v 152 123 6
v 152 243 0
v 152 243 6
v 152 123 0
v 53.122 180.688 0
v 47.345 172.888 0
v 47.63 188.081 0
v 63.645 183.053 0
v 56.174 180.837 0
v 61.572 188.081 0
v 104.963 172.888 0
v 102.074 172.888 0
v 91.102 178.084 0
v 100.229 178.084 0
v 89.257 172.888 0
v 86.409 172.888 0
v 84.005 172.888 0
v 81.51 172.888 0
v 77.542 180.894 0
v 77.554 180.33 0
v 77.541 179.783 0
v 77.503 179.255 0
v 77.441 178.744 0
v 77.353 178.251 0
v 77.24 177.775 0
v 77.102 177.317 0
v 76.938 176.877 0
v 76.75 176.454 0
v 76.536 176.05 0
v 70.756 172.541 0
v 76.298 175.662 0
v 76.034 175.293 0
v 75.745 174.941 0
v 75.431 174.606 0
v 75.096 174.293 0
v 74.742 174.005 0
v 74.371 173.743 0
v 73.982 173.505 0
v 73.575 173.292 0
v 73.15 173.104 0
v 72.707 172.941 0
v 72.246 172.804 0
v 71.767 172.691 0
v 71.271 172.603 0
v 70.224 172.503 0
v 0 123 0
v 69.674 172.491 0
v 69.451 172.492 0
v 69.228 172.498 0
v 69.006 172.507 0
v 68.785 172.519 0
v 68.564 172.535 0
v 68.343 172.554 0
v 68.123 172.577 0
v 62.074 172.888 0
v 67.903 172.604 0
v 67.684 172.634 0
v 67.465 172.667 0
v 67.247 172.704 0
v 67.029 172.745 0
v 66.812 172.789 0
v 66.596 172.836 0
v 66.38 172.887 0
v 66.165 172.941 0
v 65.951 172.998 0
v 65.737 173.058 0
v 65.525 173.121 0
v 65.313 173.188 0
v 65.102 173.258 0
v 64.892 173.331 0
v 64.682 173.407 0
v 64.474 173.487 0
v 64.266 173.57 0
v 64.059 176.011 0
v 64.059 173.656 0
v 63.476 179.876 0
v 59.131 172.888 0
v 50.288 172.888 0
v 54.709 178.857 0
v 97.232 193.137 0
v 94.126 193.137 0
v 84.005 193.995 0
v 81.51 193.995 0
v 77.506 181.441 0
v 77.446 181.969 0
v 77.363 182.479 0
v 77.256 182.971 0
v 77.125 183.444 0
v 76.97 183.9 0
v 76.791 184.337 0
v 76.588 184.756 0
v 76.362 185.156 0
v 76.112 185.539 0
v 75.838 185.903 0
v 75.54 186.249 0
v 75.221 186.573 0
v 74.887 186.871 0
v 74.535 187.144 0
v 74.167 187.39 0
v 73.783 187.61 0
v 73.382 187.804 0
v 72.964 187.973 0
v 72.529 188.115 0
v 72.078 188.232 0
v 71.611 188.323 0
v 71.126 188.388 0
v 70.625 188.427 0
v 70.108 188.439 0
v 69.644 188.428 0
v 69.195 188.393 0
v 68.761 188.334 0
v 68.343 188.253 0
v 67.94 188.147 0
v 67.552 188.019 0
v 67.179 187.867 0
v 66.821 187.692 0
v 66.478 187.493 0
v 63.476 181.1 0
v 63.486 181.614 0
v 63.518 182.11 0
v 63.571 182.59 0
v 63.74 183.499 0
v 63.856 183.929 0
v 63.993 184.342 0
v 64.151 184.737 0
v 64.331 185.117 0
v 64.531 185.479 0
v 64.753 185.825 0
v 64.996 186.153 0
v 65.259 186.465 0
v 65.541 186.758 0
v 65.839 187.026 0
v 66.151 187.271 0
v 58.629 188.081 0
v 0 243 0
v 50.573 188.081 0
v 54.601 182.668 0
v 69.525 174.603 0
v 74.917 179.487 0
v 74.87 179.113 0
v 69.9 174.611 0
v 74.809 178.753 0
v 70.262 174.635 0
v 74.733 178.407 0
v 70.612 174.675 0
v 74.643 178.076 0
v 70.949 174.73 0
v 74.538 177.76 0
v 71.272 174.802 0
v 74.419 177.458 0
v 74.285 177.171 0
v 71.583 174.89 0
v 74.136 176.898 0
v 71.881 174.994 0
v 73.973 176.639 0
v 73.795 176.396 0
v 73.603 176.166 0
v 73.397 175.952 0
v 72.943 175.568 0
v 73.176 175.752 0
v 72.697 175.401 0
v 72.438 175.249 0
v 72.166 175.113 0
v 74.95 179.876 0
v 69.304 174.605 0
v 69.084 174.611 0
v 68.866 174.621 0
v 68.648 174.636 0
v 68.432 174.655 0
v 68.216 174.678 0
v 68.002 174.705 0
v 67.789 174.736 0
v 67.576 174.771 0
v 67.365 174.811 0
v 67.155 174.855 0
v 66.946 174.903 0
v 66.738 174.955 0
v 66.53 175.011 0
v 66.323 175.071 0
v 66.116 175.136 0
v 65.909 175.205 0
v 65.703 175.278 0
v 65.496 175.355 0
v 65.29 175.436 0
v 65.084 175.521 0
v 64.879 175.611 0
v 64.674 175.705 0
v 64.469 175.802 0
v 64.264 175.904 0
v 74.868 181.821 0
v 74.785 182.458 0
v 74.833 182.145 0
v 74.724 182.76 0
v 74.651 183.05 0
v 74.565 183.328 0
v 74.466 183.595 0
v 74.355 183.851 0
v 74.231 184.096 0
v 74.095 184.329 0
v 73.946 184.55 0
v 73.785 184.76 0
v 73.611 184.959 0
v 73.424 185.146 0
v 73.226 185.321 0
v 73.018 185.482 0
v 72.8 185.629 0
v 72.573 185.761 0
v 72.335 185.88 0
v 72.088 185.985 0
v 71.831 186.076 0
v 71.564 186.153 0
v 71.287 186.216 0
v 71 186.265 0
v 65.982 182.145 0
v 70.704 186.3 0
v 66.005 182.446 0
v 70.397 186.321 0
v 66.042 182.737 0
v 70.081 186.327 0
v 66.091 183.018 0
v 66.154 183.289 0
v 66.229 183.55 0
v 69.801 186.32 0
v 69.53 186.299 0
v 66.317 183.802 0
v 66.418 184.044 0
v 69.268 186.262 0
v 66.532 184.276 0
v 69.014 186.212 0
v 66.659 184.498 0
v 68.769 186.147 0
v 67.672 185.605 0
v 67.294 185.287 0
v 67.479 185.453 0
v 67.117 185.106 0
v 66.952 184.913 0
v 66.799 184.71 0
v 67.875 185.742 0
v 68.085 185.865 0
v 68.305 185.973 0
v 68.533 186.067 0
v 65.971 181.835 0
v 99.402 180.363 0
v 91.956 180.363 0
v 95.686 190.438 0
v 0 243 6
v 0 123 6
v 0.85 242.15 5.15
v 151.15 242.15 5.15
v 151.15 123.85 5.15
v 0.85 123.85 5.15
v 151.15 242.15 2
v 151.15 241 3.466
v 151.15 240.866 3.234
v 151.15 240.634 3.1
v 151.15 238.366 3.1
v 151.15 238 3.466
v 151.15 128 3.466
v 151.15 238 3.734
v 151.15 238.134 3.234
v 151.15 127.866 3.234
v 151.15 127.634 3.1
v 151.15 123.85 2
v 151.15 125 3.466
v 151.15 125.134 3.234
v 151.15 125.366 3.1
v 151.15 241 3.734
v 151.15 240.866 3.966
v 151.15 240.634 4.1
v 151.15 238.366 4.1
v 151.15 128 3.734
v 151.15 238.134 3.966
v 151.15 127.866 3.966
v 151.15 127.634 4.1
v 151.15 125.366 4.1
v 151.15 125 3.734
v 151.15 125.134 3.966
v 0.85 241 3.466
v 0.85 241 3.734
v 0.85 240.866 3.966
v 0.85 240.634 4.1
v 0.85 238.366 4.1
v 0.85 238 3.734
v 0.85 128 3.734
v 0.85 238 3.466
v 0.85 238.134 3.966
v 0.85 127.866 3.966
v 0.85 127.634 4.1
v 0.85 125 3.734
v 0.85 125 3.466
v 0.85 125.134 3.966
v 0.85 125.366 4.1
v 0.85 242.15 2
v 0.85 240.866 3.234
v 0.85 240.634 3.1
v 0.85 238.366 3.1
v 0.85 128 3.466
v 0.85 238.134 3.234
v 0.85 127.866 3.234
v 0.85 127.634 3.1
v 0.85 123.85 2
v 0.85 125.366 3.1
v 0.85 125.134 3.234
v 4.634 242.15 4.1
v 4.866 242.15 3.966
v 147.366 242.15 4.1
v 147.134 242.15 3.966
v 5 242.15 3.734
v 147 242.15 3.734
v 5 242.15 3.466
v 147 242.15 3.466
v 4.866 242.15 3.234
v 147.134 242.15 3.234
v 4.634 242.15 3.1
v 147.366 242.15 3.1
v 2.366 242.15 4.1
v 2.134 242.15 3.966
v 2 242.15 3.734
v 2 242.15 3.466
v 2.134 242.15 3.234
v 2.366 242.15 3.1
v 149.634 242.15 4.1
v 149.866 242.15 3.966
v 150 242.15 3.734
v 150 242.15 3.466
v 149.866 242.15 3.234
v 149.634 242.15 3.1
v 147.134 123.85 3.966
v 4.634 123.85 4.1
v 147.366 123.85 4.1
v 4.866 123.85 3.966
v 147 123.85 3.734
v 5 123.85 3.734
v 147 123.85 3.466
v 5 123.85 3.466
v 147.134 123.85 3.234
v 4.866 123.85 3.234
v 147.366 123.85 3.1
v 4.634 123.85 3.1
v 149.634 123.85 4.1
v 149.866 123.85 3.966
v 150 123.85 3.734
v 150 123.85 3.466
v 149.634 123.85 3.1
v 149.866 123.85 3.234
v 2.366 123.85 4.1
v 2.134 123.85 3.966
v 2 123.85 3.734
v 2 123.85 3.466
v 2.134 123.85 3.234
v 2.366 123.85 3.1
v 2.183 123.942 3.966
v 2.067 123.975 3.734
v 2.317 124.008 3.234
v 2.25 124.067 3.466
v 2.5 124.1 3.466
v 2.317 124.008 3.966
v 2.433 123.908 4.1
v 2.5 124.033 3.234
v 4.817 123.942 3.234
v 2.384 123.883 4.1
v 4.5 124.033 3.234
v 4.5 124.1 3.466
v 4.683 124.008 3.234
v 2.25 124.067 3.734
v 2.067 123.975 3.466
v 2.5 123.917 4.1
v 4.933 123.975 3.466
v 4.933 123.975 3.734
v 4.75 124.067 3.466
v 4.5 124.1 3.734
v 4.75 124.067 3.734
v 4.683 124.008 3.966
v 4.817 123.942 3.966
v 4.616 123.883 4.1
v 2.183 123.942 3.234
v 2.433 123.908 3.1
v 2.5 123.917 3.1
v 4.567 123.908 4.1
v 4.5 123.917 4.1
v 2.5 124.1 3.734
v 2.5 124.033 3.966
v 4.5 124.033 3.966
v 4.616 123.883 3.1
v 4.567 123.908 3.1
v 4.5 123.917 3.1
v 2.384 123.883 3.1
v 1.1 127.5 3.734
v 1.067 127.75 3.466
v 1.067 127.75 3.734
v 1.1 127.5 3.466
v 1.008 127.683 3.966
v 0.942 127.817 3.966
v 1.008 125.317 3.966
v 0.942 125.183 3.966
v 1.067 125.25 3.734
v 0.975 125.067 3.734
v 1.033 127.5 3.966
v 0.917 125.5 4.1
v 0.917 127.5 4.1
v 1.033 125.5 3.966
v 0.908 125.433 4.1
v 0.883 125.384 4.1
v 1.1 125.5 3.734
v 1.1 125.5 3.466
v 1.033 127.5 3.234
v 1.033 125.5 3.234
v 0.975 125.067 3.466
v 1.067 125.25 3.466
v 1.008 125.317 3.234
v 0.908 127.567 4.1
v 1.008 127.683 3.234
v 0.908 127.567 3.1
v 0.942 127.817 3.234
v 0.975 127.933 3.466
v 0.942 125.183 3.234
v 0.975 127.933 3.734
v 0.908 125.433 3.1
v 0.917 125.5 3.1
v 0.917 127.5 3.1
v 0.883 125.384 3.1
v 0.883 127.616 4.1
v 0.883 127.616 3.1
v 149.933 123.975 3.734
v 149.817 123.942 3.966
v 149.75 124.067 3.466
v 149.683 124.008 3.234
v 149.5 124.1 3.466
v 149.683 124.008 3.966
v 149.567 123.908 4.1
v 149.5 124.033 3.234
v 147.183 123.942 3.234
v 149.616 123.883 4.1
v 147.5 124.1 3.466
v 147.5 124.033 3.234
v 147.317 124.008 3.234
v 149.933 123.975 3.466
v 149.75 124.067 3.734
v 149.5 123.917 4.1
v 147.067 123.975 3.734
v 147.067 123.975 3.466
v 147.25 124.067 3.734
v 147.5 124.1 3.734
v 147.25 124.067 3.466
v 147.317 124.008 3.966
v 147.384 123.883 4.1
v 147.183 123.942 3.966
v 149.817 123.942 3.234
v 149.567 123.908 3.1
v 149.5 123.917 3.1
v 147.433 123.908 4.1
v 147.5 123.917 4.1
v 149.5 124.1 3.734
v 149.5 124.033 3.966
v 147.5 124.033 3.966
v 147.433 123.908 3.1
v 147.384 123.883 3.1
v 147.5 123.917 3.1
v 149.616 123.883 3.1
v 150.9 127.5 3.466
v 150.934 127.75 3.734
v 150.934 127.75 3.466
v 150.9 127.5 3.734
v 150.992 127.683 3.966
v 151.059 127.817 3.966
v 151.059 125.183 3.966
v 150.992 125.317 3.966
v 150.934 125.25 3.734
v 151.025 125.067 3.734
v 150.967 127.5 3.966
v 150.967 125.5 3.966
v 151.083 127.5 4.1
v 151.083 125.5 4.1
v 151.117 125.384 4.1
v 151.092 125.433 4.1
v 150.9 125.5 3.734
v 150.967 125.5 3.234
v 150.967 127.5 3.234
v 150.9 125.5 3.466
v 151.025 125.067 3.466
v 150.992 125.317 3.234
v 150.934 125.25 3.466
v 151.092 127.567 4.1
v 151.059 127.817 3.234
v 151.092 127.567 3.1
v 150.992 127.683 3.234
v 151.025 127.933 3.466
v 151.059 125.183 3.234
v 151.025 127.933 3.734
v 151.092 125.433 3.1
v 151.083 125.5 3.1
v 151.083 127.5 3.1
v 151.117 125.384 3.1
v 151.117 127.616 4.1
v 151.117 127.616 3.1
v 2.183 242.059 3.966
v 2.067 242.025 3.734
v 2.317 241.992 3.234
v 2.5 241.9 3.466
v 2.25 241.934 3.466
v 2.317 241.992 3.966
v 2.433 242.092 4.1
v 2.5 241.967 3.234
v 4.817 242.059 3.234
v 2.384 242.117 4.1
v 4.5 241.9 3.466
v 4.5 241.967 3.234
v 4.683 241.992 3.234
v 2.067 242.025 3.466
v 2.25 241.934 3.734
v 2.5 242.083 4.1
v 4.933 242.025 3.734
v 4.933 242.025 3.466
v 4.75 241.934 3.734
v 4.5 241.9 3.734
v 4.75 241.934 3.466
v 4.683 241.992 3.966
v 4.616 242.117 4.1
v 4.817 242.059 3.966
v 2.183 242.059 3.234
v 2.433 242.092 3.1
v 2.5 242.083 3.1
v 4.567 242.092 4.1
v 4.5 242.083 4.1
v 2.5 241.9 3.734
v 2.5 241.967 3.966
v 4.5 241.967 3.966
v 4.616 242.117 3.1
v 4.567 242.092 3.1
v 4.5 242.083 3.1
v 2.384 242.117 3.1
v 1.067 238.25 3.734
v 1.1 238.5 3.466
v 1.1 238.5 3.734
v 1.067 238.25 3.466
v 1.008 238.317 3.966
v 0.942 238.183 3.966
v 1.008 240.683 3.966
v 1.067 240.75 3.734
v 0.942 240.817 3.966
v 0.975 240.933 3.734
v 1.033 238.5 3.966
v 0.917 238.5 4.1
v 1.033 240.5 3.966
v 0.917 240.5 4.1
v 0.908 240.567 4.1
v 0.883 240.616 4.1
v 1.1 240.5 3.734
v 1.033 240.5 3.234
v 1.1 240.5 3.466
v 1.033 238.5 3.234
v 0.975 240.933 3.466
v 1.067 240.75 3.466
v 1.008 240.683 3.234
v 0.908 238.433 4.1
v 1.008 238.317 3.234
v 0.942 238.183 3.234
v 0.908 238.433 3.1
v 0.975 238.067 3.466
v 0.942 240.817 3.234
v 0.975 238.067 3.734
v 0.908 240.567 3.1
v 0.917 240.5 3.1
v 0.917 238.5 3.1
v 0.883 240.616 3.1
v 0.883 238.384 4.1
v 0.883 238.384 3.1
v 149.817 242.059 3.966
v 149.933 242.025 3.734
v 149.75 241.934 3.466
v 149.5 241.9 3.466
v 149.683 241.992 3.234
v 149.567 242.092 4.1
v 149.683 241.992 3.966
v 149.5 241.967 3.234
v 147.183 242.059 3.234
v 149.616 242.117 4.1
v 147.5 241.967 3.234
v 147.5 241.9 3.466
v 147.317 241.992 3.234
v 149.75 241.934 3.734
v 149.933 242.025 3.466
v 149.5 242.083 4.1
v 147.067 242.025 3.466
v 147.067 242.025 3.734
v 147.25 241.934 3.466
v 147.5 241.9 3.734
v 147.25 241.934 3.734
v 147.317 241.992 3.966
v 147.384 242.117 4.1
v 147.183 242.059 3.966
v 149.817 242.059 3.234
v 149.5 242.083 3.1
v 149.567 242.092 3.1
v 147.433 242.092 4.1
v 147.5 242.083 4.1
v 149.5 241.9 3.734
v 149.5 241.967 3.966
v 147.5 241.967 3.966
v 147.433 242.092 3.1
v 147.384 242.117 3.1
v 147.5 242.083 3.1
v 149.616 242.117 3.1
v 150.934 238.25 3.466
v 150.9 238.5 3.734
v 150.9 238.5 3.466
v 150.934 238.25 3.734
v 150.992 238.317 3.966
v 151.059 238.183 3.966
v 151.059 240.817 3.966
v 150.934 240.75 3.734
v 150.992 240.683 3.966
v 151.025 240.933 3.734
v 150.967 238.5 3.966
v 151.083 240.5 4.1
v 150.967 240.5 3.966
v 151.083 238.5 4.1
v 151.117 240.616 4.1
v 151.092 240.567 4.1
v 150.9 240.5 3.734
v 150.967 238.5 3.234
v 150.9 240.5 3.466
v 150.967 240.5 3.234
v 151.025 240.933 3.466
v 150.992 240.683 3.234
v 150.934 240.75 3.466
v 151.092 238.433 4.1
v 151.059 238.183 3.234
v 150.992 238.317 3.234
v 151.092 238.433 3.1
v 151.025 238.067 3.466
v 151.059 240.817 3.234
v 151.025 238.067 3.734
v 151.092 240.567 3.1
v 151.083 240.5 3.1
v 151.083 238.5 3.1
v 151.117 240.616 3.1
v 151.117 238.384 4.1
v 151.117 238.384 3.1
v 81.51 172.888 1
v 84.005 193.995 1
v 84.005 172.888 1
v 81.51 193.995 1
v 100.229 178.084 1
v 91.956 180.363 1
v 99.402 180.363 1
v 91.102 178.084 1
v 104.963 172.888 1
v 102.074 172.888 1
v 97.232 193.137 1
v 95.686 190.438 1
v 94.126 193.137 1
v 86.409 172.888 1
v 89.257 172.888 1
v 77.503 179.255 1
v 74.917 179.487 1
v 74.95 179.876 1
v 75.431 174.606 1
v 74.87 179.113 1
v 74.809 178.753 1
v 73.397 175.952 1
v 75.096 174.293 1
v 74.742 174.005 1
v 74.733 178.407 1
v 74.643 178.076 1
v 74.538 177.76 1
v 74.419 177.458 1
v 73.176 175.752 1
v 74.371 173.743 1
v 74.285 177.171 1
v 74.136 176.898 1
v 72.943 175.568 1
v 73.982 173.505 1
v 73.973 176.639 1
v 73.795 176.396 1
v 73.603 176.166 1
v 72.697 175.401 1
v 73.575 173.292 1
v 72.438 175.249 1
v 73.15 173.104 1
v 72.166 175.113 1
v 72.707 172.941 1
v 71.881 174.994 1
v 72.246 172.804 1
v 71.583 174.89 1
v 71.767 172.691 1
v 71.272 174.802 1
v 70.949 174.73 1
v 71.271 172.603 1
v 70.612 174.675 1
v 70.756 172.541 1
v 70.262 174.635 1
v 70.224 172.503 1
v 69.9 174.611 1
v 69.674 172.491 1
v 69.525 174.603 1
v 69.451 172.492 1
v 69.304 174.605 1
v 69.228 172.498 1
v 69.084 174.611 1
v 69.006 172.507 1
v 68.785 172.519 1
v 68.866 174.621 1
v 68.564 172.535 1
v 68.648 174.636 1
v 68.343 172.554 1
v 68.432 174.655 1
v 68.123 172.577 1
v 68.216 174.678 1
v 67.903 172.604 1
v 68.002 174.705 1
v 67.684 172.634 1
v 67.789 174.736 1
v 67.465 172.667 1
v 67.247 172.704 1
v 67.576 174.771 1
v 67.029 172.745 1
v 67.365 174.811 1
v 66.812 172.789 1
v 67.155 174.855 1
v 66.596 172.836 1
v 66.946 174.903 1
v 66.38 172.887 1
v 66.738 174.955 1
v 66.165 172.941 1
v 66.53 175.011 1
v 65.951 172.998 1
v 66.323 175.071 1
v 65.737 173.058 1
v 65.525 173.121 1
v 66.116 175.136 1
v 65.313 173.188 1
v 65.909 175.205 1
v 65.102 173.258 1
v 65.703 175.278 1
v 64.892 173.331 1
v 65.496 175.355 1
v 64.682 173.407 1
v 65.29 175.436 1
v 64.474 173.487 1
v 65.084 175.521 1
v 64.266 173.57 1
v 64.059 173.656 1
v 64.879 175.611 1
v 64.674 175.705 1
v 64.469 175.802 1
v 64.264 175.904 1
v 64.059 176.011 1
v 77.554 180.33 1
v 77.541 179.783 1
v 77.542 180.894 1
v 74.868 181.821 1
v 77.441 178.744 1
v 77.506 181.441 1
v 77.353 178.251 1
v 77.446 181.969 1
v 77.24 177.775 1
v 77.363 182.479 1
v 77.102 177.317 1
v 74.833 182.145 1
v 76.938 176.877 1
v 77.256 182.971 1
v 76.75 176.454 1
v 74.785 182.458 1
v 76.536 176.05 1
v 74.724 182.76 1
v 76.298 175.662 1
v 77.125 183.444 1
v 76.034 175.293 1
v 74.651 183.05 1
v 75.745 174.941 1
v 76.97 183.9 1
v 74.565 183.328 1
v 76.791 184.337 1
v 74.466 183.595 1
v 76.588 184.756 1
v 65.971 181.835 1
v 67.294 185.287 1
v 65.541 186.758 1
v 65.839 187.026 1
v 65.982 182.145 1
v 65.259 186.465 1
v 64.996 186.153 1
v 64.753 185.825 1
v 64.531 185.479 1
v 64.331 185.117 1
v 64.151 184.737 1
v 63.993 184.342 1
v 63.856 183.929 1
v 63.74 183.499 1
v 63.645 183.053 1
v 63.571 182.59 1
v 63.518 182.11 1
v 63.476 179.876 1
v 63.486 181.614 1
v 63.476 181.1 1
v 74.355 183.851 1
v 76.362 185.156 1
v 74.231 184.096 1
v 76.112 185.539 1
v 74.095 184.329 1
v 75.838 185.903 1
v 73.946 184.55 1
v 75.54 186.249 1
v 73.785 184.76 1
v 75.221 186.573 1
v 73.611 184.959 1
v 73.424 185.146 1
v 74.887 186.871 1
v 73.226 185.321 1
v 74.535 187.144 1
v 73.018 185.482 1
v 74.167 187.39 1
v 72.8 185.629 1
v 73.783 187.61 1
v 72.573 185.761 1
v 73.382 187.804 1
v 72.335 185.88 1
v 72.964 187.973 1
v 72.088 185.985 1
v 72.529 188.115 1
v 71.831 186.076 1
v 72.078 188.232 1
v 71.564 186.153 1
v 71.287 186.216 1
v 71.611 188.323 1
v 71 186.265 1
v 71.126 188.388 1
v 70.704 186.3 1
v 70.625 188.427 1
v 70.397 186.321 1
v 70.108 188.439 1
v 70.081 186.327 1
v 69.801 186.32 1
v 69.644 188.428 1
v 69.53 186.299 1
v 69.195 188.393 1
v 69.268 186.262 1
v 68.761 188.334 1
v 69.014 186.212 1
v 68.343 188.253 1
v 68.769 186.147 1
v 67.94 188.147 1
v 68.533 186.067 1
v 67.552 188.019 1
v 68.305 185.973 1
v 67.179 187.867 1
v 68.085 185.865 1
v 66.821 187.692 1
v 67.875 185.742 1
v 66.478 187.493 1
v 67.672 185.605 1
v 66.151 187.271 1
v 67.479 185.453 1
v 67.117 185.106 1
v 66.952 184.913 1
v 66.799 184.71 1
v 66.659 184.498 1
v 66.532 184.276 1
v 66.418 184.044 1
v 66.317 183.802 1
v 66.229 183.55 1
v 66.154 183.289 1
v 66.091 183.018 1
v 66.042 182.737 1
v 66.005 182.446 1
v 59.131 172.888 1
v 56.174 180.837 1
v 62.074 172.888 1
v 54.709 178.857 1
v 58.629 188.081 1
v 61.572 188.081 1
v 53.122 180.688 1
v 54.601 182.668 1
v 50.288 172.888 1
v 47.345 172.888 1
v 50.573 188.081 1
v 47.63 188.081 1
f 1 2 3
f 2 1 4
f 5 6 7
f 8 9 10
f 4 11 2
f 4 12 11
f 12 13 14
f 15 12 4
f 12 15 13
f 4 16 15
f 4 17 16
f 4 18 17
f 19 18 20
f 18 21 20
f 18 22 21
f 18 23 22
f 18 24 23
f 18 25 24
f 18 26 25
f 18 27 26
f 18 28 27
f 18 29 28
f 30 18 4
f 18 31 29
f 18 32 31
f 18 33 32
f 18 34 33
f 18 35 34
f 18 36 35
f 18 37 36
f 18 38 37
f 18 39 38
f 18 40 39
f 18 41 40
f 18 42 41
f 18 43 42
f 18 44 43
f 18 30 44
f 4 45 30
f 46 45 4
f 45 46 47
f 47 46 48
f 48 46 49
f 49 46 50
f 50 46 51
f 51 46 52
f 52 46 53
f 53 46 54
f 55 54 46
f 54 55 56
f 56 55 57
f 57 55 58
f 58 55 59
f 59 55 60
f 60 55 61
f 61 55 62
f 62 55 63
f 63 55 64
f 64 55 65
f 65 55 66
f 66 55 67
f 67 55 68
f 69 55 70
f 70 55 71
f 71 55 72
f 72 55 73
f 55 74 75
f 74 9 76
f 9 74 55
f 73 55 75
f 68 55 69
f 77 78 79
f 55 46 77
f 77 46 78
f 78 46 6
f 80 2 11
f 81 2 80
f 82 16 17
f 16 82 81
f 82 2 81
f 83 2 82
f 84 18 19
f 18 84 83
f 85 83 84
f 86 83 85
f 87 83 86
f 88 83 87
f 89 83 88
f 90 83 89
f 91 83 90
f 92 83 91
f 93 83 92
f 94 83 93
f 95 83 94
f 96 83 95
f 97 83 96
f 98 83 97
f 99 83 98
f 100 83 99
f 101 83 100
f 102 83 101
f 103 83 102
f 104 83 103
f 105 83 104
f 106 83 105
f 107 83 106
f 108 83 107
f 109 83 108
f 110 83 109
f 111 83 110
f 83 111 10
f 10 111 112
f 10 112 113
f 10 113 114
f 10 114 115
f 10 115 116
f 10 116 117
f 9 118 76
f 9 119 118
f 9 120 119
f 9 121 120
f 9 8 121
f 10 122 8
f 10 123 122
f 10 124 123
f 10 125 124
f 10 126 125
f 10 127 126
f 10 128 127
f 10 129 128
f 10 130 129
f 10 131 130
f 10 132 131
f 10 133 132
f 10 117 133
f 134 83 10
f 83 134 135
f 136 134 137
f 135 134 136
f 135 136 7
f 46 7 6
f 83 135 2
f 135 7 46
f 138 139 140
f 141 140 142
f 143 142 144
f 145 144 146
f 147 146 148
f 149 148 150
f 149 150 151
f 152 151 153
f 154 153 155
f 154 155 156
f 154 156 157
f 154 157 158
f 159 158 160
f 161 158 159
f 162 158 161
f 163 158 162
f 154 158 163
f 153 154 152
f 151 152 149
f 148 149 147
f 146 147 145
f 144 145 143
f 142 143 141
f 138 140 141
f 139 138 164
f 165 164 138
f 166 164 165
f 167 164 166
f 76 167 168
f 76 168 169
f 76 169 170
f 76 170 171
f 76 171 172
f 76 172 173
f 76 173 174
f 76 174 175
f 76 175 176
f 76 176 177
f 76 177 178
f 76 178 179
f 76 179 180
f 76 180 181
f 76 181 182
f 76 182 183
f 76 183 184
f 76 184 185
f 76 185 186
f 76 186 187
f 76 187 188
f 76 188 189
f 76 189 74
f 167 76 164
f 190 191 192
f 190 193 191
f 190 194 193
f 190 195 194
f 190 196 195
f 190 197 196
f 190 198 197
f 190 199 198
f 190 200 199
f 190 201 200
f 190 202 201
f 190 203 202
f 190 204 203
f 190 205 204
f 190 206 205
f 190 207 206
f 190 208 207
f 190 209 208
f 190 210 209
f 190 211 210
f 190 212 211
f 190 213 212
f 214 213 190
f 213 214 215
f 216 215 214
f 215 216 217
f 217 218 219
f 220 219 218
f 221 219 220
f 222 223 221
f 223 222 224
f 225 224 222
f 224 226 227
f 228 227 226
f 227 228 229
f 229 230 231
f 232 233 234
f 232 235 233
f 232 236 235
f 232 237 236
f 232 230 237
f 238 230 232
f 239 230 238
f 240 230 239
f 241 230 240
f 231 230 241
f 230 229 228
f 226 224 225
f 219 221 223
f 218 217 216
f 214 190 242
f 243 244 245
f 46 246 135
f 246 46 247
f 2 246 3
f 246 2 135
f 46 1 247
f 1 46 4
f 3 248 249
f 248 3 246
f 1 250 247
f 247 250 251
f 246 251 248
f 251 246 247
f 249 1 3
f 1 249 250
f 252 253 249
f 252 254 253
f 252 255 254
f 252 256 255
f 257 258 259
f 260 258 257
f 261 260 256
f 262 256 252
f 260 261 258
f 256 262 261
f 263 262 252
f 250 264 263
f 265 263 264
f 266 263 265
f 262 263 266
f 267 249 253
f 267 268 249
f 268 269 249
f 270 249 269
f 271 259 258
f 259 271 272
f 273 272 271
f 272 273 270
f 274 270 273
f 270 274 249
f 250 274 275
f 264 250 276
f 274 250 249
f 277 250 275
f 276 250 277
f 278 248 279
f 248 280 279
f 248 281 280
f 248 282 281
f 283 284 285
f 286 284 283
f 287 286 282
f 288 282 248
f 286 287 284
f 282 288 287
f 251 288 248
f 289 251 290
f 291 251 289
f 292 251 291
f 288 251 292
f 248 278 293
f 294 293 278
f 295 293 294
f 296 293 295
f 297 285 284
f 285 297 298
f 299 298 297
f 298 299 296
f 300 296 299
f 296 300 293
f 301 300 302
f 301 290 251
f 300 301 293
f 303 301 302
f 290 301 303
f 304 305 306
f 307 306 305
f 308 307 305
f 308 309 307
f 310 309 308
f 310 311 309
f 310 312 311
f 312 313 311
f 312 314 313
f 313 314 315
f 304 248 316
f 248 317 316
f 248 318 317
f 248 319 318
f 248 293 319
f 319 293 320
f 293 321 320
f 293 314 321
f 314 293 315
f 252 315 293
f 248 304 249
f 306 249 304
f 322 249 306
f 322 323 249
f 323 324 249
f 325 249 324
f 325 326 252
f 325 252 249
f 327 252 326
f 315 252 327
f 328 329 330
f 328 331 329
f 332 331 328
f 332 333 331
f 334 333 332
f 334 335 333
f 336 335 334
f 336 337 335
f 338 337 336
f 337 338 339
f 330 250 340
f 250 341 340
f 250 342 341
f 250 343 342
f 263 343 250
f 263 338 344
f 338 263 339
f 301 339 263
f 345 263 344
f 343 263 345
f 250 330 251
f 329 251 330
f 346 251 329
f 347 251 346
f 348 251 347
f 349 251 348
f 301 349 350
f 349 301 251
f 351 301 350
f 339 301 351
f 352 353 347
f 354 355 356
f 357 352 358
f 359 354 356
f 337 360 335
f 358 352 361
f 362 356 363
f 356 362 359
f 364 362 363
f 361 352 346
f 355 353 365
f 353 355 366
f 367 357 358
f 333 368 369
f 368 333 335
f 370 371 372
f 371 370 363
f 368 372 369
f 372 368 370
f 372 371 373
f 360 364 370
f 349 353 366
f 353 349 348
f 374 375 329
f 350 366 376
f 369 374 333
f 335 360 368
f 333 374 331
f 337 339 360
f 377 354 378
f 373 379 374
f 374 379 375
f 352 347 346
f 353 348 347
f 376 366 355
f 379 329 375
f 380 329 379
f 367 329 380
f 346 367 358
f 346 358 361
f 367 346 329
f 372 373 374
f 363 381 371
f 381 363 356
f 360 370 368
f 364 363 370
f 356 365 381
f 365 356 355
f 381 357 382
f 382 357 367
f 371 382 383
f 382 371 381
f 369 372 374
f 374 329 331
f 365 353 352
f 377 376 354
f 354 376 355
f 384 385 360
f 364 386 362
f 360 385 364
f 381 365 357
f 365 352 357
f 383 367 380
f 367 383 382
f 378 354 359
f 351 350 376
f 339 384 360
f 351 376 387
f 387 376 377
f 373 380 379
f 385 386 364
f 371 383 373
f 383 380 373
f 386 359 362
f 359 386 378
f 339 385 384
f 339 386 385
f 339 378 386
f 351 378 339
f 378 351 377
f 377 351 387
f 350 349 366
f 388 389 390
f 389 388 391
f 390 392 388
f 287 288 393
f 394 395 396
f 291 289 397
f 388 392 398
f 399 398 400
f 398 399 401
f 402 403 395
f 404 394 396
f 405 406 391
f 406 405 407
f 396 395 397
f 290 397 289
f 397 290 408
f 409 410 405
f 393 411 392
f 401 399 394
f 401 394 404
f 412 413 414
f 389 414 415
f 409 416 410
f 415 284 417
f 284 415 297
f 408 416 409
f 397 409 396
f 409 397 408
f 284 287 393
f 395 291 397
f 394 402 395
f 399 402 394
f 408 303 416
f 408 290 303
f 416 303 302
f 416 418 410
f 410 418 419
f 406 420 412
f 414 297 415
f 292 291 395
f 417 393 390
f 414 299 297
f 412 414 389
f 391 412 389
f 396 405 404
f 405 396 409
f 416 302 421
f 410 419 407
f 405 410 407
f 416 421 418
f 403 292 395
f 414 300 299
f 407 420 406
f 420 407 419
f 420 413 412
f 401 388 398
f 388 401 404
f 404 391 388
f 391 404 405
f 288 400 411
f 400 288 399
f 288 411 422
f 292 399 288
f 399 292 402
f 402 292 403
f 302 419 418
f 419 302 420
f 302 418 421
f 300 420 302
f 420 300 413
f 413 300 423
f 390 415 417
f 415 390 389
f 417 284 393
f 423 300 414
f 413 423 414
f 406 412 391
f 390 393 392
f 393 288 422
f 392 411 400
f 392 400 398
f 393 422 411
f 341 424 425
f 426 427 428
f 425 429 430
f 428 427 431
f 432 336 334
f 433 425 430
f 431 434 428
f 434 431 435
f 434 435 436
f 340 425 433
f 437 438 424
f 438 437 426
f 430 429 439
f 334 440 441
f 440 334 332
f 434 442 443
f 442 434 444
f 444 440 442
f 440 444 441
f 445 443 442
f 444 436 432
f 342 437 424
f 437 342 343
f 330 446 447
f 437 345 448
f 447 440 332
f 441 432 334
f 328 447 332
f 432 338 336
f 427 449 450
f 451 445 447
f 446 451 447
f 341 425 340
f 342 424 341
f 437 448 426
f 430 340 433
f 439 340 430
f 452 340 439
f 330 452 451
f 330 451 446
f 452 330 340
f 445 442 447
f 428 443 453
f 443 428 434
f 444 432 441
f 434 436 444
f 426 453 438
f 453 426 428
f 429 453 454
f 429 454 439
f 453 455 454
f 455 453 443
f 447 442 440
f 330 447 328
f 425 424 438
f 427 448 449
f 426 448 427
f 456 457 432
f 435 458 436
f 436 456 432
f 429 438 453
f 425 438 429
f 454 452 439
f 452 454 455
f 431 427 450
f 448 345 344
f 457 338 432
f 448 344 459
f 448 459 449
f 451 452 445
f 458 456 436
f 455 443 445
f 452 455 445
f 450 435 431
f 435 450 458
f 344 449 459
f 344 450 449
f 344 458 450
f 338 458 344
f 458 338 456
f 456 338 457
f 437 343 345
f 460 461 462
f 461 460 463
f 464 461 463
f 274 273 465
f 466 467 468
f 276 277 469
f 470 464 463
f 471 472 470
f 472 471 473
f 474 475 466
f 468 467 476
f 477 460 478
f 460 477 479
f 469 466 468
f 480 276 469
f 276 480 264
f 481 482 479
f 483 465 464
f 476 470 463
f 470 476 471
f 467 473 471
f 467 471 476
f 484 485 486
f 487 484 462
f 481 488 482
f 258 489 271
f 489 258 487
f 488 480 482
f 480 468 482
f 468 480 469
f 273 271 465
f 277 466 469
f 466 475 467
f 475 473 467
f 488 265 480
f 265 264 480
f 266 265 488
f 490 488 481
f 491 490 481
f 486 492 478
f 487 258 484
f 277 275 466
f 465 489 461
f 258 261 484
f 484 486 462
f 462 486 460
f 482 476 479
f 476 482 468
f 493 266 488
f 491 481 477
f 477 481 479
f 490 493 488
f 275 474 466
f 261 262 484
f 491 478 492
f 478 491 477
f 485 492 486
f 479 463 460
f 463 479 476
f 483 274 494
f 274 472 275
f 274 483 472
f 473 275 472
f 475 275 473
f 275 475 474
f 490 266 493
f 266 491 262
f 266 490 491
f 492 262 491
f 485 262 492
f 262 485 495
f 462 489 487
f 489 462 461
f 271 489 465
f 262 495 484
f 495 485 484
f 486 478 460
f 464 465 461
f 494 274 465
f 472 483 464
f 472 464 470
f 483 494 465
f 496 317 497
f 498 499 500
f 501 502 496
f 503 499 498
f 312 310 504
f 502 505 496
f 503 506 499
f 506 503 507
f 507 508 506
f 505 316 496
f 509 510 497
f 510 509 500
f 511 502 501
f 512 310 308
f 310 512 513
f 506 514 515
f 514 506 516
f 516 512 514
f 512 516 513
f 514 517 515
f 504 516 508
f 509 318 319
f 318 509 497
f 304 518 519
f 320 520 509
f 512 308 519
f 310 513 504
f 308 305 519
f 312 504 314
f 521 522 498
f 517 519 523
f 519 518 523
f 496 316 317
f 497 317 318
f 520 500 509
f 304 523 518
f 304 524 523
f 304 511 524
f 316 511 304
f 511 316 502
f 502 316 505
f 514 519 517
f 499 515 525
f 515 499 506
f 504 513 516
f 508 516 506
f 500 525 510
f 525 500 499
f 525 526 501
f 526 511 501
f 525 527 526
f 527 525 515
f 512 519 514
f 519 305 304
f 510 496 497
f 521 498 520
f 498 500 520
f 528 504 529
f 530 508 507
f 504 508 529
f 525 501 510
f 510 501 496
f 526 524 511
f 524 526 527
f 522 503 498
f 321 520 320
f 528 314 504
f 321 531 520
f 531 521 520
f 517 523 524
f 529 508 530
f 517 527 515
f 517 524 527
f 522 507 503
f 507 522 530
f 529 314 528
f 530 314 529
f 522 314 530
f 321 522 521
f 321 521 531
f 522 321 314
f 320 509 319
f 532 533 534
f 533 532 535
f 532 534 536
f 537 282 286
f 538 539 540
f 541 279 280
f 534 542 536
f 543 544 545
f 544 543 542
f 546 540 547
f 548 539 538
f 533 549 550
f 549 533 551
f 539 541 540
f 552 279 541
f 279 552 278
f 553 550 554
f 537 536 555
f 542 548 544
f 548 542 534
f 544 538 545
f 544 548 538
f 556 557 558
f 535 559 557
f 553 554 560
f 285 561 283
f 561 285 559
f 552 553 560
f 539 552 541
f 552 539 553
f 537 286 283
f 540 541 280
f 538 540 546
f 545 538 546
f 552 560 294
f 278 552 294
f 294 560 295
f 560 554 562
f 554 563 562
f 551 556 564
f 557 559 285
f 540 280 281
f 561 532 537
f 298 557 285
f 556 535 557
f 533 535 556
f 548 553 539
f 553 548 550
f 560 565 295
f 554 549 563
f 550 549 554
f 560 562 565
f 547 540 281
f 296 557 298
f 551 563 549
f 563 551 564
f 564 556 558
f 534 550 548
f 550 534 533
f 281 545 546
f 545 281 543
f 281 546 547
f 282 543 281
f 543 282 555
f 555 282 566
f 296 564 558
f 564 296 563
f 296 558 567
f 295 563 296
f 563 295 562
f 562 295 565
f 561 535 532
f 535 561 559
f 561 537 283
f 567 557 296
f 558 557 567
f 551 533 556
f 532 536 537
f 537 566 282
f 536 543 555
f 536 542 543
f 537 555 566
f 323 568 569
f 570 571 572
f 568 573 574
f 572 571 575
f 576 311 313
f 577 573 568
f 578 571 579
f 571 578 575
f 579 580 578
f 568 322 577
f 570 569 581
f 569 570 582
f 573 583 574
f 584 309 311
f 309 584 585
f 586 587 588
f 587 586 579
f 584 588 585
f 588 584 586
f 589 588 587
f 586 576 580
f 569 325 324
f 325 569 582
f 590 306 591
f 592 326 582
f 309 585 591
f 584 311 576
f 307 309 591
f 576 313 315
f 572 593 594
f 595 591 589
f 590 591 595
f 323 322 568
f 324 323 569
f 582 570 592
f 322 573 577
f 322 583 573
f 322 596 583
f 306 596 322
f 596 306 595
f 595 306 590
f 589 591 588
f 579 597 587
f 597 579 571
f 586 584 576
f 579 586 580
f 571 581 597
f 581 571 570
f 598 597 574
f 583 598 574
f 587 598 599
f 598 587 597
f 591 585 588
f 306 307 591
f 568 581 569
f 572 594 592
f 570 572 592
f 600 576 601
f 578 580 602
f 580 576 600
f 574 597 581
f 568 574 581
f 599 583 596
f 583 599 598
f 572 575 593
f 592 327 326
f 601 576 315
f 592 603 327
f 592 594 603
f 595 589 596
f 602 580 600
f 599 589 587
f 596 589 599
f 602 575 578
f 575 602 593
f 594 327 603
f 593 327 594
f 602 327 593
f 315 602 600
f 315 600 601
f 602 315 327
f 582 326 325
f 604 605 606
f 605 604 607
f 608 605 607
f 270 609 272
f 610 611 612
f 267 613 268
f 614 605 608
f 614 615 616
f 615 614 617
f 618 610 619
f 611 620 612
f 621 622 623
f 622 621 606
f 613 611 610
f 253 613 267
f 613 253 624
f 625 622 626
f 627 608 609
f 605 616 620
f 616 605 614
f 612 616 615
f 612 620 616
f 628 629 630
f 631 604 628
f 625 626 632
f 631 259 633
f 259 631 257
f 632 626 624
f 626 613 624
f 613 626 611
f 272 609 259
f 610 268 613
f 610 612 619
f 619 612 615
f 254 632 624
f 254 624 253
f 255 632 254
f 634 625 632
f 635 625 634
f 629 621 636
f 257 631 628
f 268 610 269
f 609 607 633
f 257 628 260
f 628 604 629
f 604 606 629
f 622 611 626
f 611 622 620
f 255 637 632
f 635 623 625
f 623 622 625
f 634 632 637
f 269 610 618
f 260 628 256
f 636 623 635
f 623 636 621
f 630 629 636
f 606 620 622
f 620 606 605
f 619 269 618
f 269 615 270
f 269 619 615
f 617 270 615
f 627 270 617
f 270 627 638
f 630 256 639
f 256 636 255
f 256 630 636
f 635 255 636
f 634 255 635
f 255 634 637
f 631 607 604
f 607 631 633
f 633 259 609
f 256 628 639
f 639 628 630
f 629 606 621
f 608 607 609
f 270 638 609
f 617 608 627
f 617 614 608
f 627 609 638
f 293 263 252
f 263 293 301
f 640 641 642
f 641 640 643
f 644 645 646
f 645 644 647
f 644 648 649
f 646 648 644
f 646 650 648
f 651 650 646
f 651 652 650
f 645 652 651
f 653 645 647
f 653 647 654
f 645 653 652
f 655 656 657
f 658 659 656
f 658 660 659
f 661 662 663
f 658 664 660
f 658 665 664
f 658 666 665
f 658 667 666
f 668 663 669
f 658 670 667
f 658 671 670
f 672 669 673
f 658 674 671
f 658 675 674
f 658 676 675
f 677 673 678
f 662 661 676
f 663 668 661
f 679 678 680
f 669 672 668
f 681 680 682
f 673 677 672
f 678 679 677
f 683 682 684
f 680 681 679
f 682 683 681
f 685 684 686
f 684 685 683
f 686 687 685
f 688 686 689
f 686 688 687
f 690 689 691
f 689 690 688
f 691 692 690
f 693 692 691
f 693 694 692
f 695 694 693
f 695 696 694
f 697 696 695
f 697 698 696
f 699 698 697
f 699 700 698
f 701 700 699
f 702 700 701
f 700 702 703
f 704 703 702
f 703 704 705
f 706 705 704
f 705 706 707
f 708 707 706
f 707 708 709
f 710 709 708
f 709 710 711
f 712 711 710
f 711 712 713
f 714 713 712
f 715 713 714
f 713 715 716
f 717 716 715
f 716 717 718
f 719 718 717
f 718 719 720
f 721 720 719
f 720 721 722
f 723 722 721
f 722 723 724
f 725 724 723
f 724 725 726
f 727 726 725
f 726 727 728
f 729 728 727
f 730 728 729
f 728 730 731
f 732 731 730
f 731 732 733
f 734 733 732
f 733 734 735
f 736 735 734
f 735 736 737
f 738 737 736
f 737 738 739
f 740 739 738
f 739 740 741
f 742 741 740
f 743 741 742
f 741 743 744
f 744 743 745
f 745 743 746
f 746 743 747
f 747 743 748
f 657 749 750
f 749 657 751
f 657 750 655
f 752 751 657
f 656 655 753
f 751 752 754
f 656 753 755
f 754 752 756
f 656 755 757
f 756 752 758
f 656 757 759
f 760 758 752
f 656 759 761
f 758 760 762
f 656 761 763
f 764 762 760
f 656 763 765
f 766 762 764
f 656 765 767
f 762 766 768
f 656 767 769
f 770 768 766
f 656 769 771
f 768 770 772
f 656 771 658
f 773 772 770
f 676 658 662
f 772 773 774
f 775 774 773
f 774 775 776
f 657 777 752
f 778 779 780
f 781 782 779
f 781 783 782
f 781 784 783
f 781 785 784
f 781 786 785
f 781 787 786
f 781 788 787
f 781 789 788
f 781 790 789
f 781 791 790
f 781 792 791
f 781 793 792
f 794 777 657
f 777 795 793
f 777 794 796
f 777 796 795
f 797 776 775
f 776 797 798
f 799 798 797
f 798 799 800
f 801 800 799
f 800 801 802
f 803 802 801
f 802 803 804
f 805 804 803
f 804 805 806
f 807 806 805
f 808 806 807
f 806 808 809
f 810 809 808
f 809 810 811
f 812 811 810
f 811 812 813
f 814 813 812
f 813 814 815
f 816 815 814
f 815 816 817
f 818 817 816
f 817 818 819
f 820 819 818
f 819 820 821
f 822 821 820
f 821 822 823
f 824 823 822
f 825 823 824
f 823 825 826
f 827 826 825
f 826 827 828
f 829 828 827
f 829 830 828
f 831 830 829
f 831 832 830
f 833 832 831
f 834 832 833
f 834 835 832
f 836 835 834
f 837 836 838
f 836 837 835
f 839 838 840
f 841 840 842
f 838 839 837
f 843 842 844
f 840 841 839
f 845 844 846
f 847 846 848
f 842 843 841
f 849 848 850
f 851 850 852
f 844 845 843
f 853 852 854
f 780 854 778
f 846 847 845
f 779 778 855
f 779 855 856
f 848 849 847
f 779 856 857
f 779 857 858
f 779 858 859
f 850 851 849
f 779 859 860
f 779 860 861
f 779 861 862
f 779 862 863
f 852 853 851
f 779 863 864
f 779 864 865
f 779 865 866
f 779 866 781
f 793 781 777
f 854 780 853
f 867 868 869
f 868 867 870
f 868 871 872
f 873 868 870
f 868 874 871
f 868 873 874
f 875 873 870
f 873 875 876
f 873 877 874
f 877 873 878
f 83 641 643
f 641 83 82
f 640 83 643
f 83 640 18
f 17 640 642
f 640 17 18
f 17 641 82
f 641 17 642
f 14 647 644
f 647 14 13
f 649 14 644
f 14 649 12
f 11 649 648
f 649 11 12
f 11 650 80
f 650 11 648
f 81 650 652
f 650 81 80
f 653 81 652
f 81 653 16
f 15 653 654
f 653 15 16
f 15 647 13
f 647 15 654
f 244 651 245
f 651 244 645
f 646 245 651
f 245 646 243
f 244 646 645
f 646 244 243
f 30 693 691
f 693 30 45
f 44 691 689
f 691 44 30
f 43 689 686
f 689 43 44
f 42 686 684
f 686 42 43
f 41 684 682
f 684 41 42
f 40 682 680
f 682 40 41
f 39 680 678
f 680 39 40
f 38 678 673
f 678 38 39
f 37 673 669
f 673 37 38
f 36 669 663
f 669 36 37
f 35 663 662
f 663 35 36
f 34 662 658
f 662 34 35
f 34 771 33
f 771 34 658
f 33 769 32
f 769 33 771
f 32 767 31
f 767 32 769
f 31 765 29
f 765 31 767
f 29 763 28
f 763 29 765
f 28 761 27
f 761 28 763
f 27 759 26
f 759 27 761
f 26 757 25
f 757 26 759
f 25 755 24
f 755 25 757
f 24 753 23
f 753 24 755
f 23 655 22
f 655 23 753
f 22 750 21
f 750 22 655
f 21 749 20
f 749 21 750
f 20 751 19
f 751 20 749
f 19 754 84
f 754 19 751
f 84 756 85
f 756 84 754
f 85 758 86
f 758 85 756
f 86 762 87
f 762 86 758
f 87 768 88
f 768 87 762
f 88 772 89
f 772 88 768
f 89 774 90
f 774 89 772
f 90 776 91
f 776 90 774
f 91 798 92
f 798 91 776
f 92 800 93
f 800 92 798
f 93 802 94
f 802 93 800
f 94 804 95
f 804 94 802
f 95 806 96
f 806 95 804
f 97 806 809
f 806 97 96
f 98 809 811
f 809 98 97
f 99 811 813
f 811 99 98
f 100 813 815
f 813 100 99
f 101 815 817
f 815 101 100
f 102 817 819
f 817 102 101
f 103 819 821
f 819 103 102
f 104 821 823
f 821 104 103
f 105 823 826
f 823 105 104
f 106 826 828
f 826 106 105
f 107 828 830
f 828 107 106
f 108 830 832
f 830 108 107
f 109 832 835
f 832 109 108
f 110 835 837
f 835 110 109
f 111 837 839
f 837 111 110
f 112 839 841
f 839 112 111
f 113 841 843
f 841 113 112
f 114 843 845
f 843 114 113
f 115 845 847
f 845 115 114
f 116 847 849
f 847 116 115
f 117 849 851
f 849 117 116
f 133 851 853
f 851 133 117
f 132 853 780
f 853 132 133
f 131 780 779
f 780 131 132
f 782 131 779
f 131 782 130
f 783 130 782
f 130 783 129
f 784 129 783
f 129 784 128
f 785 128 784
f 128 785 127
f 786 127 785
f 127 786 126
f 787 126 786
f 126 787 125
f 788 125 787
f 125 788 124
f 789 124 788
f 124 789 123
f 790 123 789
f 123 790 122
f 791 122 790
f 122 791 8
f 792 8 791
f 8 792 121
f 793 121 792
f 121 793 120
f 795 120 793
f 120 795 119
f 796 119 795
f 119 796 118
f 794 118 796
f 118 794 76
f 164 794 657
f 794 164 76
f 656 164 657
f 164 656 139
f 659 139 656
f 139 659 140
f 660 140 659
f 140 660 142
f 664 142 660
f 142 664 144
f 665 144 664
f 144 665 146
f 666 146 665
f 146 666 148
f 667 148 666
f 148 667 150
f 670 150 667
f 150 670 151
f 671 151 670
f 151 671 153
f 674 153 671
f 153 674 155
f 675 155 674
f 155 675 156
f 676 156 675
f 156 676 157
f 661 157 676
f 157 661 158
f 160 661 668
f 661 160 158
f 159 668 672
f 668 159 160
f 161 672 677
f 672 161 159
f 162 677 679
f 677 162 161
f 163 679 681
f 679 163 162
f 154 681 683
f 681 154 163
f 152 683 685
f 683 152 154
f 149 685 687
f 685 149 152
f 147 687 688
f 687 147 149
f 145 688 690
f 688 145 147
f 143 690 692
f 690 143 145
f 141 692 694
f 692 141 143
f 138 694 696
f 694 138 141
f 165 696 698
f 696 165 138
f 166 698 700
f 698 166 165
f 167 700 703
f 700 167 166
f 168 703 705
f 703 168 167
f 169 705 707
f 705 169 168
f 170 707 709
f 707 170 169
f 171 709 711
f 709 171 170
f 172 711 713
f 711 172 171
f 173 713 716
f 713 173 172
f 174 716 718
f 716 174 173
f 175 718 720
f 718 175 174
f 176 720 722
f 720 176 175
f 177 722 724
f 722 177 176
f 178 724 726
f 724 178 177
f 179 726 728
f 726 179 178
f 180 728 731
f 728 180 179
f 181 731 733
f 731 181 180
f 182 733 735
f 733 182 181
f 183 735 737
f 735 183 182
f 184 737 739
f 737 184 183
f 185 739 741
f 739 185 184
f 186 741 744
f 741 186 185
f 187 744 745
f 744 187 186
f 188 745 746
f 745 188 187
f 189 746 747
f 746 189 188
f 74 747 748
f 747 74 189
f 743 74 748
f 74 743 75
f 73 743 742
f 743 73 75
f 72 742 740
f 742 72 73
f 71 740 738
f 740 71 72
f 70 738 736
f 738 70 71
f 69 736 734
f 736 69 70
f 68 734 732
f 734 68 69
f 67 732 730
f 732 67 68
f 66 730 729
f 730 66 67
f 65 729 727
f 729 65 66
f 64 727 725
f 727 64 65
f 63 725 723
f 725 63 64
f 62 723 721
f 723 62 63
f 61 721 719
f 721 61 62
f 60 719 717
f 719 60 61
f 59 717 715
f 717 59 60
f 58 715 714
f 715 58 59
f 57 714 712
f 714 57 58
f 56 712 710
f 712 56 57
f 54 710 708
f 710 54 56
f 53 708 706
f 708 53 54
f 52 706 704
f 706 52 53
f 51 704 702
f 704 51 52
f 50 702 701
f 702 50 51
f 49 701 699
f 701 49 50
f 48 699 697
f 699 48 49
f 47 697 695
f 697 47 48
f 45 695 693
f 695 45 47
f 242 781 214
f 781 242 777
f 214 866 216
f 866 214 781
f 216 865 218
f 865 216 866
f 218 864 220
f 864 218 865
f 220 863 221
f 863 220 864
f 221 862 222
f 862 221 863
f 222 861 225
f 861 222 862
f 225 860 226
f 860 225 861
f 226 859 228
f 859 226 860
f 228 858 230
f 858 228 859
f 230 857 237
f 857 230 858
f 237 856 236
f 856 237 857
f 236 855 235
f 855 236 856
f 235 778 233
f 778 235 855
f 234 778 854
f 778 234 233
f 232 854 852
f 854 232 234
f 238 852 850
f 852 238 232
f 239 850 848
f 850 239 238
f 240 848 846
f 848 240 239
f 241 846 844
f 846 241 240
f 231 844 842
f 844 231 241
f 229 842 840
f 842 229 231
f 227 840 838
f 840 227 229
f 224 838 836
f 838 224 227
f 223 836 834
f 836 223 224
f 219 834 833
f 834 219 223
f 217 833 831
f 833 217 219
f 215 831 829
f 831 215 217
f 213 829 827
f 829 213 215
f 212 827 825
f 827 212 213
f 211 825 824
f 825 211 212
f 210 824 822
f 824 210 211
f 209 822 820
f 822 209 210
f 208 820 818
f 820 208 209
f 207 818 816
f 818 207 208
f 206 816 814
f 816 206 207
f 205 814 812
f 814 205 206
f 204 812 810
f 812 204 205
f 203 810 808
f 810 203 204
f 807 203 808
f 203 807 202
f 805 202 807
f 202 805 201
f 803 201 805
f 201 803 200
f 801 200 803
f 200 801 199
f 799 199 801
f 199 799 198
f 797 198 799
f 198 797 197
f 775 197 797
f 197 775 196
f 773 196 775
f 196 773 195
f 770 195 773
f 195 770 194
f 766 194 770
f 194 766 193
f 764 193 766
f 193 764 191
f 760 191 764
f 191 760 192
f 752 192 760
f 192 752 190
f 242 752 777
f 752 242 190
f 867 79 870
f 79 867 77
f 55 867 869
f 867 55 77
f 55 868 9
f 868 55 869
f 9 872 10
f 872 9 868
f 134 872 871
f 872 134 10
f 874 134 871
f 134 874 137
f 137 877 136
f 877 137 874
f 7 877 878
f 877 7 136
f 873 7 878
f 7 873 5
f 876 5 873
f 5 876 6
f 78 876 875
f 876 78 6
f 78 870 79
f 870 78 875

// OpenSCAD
insert_font = "Futura:style=Medium";
include <../../The-Boardgame-Insert-Toolkit/boardgame_insert_toolkit_lib.2.scad>;
include <../../BFD-Insert-Extensions/InsertExtensions.scad>;

$fn = 100;


// Used to visualize how all of the boxes fit together. 
//g_b_visualization = true;          
        
// this is the outer wall thickness. 
//Default = 1.5mm
g_wall_thickness = 2.0;
g_lid_thickness = 2.0;
g_min_bottom_thickness = 1.0;


// The tolerance value is extra space put between planes of the lid and box that fit together.
// Increase the tolerance to loosen the fit and decrease it to tighten it.
//
// Note that the tolerance is applied exclusivelysto the lid.
// So if the lid is too tight or too loose, change this value ( up for looser fit, down for tighter fit ) and 
// you only need to reprint the lid.
// 
// The exception is the stackable box, where the bottom of the box is the lid of the box below,
// in which case the tolerance also affects that box bottom.
//
g_tolerance = 0.15;
g_detent_thickness = 0.25;

// This adjusts the position of the lid detents downward. 
// The larger the value, the bigger the gap between the lid and the box.
g_tolerance_detents_pos = 0.1;

card_sizes = [[52,74],[67,92],[49,71]];
card_width = 67;
card_height = 92;

include <SmallCardBox.scad>;
include <LootCardsBox.scad>;
include <ModifierCardsBox.scad>;
include <BattleCardsBox.scad>;
include <MonsterStatsBox.scad>;
include <MonsterBoxes.scad>;
include <ObstacleBoxes.scad>;
include <LargeCards.scad>;
include <BossBox.scad>;
include <StatusTokens.scad>;
include <DamageTokens.scad>;
include <PlayerBoxes.scad>;
include <MinisBox.scad>;
include <EnvelopeBox.scad>;
include <PlasticBases.scad>;

// Focus on one box
g_isolated_print_box = "Alex"; 
g_b_print_lid = true;
g_b_print_box = false; 
     
data =
[ 
    smallCardBox(),
    // Print 6
    smallUnavailableMarker(),
    // Print 1
    smallCompletedMarker(),
    // Print 1
    smallBlueprintsMarker(),
    lootCardsBox(),
    modifierCardsBox(),
    battleCardsBox(),
    monsterStatsBox(),
    monsterBox1(),
    monsterBox2(),
    monsterBox3(),
    monsterBox4(),
    monsterBox5(),
    obstacleBox1(),
    obstacleBox2(),
    obstacleBox3(),
    obstacleBox4(),
    largeCardBox(),
    // Print 5
    largeUnavailableMarker(),
    // Print 4
    largeRemovedMarker(),
    bossBox(),
    statusTokens(),
    damageTokensBottom(),
    damageTokensMiddle(),
    damageTokensTop(),
    playerBox("Player 1"),
    playerBox("Player 2"),
    playerBox("Player 3"),
    playerBox("Player 4"),
    playerBox("Bill"),
    playerBox("Brad"),
    playerBox("Alex"),
    playerBox("Ben"),
    minisBox(),
    envelopesBox(),
    plasticBasesBox(),
];

//echo(data);
MakeAll();
